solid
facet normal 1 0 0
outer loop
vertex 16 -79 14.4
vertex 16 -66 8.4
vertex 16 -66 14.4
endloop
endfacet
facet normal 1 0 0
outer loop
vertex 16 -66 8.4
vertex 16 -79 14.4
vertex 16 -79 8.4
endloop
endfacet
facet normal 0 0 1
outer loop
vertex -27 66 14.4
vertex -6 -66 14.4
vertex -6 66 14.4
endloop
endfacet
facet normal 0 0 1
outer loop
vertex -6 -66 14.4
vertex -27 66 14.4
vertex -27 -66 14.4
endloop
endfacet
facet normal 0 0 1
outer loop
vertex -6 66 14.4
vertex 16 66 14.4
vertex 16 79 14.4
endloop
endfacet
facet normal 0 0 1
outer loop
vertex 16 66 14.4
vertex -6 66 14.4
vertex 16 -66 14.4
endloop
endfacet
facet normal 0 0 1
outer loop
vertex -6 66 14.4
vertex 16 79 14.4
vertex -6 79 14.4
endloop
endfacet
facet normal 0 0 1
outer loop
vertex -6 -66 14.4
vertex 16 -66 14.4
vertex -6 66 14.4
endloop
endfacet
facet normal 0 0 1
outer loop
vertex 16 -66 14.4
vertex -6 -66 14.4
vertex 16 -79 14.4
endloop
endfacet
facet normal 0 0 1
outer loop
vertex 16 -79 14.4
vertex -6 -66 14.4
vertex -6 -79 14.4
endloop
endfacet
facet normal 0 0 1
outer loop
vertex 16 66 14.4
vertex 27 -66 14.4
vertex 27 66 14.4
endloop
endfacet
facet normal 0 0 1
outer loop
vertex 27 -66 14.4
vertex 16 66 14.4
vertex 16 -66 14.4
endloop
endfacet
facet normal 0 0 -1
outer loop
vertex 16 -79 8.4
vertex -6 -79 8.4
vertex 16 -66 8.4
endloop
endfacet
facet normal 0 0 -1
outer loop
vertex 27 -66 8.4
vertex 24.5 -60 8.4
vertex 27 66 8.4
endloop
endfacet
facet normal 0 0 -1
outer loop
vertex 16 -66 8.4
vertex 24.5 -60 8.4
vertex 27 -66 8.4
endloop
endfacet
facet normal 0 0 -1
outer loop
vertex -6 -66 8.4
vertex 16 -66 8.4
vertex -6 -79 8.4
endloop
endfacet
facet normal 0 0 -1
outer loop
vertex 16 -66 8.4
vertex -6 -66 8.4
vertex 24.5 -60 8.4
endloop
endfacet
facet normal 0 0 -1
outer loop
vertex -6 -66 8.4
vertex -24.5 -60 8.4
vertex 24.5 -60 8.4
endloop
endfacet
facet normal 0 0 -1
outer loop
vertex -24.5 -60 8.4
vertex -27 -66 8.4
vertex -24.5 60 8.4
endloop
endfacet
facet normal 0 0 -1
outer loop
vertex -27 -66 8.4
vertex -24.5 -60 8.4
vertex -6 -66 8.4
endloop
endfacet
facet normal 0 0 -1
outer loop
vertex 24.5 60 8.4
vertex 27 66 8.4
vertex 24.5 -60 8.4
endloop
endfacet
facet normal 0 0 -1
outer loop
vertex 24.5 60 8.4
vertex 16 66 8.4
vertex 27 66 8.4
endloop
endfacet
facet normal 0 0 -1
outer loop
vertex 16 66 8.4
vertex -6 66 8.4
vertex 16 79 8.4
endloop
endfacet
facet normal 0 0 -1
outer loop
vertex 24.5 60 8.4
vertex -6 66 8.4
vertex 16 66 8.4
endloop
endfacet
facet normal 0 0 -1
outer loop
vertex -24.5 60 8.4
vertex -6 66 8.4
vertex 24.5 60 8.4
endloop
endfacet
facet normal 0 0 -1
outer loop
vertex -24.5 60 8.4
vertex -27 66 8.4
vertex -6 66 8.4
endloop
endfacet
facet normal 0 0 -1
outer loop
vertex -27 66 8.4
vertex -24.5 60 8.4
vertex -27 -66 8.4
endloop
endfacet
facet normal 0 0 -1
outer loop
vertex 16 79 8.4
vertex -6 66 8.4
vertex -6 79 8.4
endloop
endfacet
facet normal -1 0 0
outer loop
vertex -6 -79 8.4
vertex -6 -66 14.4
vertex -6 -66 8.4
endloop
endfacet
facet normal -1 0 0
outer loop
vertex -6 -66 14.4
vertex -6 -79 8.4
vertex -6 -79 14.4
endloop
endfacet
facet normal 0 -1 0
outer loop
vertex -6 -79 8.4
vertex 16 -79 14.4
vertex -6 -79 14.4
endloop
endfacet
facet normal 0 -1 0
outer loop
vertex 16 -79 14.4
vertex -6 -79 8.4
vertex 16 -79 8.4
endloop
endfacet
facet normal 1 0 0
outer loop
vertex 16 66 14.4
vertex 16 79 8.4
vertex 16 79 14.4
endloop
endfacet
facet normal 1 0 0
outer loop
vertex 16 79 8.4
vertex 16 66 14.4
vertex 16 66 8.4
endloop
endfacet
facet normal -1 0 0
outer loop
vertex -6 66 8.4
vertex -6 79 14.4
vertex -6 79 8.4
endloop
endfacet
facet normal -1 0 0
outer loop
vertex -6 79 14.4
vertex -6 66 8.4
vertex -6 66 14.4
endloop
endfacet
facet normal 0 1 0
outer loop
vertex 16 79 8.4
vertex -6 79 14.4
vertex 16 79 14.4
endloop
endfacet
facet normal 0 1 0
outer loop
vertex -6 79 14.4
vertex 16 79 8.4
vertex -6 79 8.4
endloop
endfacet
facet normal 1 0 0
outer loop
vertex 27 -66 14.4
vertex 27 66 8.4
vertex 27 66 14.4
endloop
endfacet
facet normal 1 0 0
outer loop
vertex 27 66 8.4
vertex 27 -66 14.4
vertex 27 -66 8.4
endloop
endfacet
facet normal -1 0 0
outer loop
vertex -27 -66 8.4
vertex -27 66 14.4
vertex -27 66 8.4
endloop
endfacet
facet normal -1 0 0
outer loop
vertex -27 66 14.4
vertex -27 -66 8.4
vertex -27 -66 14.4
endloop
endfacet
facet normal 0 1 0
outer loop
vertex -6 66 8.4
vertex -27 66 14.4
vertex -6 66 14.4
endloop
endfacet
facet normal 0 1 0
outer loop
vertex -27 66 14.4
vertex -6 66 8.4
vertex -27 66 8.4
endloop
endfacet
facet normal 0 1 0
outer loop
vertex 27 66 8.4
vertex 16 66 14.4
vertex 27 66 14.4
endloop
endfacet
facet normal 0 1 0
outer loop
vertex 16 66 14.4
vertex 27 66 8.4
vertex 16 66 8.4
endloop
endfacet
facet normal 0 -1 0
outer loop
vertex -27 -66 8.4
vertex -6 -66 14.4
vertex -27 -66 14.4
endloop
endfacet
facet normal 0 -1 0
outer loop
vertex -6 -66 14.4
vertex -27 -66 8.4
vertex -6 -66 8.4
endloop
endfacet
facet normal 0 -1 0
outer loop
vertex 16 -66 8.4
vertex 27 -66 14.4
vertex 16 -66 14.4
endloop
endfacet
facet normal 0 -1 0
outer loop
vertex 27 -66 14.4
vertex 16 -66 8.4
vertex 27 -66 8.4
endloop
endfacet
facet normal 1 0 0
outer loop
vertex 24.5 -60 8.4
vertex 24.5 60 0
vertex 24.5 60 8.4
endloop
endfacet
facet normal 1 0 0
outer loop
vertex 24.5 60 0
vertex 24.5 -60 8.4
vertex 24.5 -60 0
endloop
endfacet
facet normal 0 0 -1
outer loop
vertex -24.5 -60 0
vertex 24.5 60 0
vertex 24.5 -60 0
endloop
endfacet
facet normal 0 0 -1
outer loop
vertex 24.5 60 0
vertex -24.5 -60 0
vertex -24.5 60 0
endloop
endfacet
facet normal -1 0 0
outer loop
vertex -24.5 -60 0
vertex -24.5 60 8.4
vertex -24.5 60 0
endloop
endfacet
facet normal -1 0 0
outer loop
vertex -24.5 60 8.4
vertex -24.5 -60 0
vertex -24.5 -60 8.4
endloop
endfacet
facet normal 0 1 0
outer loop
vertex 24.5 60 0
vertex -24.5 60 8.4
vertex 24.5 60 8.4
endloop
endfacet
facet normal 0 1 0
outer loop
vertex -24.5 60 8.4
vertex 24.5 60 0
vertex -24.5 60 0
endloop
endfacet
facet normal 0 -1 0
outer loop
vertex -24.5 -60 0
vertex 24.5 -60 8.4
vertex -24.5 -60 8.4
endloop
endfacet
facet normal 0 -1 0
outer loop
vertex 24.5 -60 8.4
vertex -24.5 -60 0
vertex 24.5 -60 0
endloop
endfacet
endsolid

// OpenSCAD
// Nominal bench geometry in mm. This model does not specify replacement brake parts.
part = "pad";
lining = 8.4;
gauge = 8;
module box(center, size) { translate(center) cube(size, center=true); }
module pad() {
    color("dimgray") box([0,0,lining/2], [49,120,lining]);
    color("silver") {
        box([0,0,lining+3], [54,132,6]);
        for (side=[-1,1]) box([5,side*68,lining+3], [22,22,6]);
    }
}
module rotor() {
    difference() {
        translate([0,0,21]) cylinder(r=148,h=28,$fn=64);
        translate([0,0,20]) cylinder(r=71,h=30,$fn=64);
    }
    difference() {
        cylinder(r=76,h=30,$fn=64);
        translate([0,0,-1]) cylinder(r=31,h=32,$fn=64);
    }
}
module tool() {
    color("seagreen") {
        box([0,0,0],[4,gauge,gauge]);
        box([0,-(46+gauge/2)/2,-gauge/2+3],[4,46-gauge/2,6]);
        box([0,-89,13],[4,29,18]);
        hull() {
            box([0,-46,-gauge/2+3],[4,.1,6]);
            box([0,-74,13],[4,.1,18]);
        }
        translate([0,-103,13]) rotate([0,90,0])
            difference() {
                cylinder(r=9,h=4,center=true,$fn=32);
                cylinder(r=3.2,h=5,center=true,$fn=32);
            }
    }
}
if (part=="pad") pad();
if (part=="rotor") rotor();
if (part=="gauge") tool();
